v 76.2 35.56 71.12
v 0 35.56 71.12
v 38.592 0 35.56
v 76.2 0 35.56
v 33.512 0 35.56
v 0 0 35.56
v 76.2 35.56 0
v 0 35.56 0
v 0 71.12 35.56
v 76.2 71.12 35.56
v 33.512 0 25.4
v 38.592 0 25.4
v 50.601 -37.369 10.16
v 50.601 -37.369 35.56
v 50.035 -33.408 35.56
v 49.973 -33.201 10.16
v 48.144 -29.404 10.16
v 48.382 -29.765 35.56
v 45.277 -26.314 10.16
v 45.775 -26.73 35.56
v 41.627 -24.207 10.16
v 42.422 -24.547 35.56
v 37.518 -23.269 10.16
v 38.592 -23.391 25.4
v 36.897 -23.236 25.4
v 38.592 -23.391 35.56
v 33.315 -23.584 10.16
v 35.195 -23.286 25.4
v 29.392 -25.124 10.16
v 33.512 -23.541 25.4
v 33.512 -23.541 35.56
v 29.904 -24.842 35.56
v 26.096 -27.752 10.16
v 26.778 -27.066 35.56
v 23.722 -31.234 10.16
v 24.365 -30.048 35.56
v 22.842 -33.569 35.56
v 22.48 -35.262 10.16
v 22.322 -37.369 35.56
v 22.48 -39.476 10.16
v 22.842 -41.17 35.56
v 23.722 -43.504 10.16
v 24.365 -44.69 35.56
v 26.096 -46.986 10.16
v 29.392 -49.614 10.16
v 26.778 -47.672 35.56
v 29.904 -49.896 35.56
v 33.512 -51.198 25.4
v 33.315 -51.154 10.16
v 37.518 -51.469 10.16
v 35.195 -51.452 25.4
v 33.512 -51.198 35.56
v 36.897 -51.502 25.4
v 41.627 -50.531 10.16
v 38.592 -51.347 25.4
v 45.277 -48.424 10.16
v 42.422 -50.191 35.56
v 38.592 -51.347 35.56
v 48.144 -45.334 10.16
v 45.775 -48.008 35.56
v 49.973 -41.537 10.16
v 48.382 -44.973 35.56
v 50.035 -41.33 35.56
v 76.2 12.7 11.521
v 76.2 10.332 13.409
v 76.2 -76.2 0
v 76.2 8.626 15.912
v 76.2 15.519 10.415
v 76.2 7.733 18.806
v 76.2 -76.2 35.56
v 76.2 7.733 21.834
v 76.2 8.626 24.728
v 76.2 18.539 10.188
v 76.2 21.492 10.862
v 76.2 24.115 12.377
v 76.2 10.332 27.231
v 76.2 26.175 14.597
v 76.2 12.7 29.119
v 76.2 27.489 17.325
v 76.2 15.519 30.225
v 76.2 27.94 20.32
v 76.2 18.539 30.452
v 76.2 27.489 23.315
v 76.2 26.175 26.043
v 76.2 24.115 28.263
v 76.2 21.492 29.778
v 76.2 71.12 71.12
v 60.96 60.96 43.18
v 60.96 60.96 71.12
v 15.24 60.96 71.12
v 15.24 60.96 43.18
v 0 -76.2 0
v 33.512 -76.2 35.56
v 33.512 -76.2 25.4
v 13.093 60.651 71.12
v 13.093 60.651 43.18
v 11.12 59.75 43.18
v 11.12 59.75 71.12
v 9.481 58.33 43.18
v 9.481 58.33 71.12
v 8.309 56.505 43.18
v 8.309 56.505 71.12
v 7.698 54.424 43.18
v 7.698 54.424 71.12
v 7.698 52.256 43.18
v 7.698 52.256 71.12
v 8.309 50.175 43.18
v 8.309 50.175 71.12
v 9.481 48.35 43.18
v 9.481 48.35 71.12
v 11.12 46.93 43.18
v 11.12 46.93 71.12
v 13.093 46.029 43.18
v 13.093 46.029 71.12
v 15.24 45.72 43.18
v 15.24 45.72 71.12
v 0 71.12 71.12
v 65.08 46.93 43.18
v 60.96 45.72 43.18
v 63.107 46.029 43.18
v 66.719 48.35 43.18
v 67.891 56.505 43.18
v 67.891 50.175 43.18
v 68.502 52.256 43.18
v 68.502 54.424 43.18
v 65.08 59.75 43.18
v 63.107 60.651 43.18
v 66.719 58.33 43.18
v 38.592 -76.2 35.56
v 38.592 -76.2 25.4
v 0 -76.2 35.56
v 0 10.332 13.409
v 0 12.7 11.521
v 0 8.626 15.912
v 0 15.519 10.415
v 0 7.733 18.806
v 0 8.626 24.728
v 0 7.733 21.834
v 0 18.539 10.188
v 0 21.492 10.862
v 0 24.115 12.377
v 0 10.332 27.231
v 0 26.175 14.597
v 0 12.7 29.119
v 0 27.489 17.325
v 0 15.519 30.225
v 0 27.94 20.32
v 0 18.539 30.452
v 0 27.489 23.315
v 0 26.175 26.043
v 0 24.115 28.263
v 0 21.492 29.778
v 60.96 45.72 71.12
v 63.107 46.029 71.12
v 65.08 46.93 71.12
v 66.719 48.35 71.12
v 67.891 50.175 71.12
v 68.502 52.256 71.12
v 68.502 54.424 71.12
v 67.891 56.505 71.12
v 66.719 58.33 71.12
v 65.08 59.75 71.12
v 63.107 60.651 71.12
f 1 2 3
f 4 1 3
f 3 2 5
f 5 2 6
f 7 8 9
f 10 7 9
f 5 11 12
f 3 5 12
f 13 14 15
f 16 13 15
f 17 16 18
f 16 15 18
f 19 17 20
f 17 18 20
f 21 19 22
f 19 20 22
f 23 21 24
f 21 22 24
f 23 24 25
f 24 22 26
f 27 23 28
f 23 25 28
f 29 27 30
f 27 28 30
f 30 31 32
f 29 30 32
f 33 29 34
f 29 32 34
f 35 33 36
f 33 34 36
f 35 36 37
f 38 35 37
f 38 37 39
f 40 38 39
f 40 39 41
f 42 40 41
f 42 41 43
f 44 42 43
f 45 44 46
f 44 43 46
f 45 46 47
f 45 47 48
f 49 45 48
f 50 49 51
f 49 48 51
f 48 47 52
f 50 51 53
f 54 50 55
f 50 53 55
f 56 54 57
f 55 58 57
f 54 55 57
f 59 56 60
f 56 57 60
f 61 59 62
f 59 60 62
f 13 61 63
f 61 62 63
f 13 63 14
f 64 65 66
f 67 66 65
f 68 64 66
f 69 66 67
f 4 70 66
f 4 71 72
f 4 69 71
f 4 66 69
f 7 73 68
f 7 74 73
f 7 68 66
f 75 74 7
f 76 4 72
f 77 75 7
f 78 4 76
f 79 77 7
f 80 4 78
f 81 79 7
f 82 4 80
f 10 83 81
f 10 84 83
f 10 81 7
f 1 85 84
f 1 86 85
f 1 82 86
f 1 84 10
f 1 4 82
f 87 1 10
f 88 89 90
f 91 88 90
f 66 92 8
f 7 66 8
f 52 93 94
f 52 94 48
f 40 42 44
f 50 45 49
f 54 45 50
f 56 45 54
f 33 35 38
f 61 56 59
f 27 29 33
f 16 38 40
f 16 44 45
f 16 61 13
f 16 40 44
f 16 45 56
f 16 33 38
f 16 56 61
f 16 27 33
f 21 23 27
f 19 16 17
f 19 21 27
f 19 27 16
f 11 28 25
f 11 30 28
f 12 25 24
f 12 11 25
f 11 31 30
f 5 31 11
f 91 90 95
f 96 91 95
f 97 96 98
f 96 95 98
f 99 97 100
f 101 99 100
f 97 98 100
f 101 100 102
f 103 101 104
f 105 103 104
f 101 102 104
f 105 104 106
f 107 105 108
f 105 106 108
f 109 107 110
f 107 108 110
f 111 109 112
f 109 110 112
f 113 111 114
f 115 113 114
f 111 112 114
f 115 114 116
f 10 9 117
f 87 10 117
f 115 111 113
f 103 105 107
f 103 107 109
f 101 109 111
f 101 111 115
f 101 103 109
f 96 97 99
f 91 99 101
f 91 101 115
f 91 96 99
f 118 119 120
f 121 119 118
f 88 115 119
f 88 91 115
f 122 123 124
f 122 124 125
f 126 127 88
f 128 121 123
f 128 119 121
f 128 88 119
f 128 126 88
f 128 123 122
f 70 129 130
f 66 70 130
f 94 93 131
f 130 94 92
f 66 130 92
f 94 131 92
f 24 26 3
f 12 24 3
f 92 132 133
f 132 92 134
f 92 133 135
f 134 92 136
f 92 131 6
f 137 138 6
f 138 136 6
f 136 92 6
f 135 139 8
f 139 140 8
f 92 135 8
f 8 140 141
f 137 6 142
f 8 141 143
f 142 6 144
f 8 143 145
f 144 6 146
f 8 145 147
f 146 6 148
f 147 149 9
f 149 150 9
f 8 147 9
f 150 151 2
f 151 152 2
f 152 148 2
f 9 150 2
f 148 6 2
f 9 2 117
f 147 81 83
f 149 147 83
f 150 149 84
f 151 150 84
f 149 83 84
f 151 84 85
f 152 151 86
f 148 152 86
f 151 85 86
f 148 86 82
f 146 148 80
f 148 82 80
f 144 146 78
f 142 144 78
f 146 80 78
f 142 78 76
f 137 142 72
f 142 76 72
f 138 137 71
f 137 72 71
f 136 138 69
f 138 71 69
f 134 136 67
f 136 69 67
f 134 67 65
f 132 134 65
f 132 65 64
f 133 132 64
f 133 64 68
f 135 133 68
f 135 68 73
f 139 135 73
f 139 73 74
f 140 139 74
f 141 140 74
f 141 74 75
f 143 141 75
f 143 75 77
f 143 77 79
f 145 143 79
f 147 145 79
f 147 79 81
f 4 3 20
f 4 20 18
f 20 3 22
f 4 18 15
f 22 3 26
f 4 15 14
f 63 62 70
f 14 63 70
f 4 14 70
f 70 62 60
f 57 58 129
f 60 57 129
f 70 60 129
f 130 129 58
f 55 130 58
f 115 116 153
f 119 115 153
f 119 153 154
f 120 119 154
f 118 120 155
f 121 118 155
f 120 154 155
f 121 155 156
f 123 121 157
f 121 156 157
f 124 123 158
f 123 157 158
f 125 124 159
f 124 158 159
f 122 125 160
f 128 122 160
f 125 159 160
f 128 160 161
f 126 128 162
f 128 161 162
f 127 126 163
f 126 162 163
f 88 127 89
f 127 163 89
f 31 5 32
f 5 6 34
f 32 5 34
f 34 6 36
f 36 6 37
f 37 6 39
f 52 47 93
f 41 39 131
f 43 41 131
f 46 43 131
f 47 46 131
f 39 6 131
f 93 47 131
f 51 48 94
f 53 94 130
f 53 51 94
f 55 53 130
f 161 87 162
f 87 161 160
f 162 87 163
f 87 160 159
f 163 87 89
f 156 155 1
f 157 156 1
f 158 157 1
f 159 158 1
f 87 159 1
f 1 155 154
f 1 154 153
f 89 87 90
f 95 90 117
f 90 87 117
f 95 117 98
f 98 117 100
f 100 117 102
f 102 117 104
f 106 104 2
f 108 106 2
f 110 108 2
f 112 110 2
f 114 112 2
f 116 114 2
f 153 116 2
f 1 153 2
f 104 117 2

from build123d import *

# Parameters (mm, degrees)
F1_DEPTH = 76.2
F3_DEPTH = 27.94
F4_R     = 10.16
F5_DEPTH = 76.201
F6_W     = 5.08
F6_H     = 76.2
F7_DEPTH = 10.16
F8_R     = 14.139528
F9_DEPTH = 25.4


with BuildPart() as f1:
    # F0 (on Right) → F1 (new body)
    with BuildSketch(Plane.YZ):
        Polygon((-76.2, 35.56), (-76.2, 0), (35.56, 0), (71.12, 35.56), (71.12, 71.12), (35.56, 71.12), (0, 35.56), align=None)
    extrude(amount=F1_DEPTH)

    # F2 (on face) → F3 (cut)
    with BuildSketch(Plane.XY.offset(71.12)):
        with BuildLine():
            Line((60.96, 60.96), (15.24, 60.96))
            ThreePointArc((15.24, 60.96), (7.62, 53.34), (15.24, 45.72))
            Line((15.24, 45.72), (60.96, 45.72))
            ThreePointArc((60.96, 45.72), (68.58, 53.34), (60.96, 60.96))
        make_face()
    extrude(amount=-F3_DEPTH, mode=Mode.SUBTRACT)

    # F4 (on face) → F5 (cut, through all)
    with BuildSketch(Plane.YZ.offset(76.2)):
        with Locations((17.78, 20.32)):
            Circle(F4_R)
    extrude(amount=-F5_DEPTH, mode=Mode.SUBTRACT)

    # F6 (on face) → F7 (cut)
    with BuildSketch(Plane.XY.offset(35.56)):
        with Locations((36.052045, -38.1)):
            Rectangle(F6_W, F6_H)
    extrude(amount=-F7_DEPTH, mode=Mode.SUBTRACT)

    # F8 (on face) → F9 (cut)
    with BuildSketch(Plane.XY.offset(35.56)):
        with Locations((36.461484, -37.369102)):
            Circle(F8_R)
    extrude(amount=-F9_DEPTH, mode=Mode.SUBTRACT)


solid = f1.part
